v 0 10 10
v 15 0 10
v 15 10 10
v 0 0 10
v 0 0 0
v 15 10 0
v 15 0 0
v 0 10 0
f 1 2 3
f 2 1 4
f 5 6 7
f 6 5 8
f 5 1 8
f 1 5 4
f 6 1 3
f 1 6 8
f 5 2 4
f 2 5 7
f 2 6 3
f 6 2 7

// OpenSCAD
union() { color("red") cube(10); color("blue") translate([5,0,0]) cube(10); }
